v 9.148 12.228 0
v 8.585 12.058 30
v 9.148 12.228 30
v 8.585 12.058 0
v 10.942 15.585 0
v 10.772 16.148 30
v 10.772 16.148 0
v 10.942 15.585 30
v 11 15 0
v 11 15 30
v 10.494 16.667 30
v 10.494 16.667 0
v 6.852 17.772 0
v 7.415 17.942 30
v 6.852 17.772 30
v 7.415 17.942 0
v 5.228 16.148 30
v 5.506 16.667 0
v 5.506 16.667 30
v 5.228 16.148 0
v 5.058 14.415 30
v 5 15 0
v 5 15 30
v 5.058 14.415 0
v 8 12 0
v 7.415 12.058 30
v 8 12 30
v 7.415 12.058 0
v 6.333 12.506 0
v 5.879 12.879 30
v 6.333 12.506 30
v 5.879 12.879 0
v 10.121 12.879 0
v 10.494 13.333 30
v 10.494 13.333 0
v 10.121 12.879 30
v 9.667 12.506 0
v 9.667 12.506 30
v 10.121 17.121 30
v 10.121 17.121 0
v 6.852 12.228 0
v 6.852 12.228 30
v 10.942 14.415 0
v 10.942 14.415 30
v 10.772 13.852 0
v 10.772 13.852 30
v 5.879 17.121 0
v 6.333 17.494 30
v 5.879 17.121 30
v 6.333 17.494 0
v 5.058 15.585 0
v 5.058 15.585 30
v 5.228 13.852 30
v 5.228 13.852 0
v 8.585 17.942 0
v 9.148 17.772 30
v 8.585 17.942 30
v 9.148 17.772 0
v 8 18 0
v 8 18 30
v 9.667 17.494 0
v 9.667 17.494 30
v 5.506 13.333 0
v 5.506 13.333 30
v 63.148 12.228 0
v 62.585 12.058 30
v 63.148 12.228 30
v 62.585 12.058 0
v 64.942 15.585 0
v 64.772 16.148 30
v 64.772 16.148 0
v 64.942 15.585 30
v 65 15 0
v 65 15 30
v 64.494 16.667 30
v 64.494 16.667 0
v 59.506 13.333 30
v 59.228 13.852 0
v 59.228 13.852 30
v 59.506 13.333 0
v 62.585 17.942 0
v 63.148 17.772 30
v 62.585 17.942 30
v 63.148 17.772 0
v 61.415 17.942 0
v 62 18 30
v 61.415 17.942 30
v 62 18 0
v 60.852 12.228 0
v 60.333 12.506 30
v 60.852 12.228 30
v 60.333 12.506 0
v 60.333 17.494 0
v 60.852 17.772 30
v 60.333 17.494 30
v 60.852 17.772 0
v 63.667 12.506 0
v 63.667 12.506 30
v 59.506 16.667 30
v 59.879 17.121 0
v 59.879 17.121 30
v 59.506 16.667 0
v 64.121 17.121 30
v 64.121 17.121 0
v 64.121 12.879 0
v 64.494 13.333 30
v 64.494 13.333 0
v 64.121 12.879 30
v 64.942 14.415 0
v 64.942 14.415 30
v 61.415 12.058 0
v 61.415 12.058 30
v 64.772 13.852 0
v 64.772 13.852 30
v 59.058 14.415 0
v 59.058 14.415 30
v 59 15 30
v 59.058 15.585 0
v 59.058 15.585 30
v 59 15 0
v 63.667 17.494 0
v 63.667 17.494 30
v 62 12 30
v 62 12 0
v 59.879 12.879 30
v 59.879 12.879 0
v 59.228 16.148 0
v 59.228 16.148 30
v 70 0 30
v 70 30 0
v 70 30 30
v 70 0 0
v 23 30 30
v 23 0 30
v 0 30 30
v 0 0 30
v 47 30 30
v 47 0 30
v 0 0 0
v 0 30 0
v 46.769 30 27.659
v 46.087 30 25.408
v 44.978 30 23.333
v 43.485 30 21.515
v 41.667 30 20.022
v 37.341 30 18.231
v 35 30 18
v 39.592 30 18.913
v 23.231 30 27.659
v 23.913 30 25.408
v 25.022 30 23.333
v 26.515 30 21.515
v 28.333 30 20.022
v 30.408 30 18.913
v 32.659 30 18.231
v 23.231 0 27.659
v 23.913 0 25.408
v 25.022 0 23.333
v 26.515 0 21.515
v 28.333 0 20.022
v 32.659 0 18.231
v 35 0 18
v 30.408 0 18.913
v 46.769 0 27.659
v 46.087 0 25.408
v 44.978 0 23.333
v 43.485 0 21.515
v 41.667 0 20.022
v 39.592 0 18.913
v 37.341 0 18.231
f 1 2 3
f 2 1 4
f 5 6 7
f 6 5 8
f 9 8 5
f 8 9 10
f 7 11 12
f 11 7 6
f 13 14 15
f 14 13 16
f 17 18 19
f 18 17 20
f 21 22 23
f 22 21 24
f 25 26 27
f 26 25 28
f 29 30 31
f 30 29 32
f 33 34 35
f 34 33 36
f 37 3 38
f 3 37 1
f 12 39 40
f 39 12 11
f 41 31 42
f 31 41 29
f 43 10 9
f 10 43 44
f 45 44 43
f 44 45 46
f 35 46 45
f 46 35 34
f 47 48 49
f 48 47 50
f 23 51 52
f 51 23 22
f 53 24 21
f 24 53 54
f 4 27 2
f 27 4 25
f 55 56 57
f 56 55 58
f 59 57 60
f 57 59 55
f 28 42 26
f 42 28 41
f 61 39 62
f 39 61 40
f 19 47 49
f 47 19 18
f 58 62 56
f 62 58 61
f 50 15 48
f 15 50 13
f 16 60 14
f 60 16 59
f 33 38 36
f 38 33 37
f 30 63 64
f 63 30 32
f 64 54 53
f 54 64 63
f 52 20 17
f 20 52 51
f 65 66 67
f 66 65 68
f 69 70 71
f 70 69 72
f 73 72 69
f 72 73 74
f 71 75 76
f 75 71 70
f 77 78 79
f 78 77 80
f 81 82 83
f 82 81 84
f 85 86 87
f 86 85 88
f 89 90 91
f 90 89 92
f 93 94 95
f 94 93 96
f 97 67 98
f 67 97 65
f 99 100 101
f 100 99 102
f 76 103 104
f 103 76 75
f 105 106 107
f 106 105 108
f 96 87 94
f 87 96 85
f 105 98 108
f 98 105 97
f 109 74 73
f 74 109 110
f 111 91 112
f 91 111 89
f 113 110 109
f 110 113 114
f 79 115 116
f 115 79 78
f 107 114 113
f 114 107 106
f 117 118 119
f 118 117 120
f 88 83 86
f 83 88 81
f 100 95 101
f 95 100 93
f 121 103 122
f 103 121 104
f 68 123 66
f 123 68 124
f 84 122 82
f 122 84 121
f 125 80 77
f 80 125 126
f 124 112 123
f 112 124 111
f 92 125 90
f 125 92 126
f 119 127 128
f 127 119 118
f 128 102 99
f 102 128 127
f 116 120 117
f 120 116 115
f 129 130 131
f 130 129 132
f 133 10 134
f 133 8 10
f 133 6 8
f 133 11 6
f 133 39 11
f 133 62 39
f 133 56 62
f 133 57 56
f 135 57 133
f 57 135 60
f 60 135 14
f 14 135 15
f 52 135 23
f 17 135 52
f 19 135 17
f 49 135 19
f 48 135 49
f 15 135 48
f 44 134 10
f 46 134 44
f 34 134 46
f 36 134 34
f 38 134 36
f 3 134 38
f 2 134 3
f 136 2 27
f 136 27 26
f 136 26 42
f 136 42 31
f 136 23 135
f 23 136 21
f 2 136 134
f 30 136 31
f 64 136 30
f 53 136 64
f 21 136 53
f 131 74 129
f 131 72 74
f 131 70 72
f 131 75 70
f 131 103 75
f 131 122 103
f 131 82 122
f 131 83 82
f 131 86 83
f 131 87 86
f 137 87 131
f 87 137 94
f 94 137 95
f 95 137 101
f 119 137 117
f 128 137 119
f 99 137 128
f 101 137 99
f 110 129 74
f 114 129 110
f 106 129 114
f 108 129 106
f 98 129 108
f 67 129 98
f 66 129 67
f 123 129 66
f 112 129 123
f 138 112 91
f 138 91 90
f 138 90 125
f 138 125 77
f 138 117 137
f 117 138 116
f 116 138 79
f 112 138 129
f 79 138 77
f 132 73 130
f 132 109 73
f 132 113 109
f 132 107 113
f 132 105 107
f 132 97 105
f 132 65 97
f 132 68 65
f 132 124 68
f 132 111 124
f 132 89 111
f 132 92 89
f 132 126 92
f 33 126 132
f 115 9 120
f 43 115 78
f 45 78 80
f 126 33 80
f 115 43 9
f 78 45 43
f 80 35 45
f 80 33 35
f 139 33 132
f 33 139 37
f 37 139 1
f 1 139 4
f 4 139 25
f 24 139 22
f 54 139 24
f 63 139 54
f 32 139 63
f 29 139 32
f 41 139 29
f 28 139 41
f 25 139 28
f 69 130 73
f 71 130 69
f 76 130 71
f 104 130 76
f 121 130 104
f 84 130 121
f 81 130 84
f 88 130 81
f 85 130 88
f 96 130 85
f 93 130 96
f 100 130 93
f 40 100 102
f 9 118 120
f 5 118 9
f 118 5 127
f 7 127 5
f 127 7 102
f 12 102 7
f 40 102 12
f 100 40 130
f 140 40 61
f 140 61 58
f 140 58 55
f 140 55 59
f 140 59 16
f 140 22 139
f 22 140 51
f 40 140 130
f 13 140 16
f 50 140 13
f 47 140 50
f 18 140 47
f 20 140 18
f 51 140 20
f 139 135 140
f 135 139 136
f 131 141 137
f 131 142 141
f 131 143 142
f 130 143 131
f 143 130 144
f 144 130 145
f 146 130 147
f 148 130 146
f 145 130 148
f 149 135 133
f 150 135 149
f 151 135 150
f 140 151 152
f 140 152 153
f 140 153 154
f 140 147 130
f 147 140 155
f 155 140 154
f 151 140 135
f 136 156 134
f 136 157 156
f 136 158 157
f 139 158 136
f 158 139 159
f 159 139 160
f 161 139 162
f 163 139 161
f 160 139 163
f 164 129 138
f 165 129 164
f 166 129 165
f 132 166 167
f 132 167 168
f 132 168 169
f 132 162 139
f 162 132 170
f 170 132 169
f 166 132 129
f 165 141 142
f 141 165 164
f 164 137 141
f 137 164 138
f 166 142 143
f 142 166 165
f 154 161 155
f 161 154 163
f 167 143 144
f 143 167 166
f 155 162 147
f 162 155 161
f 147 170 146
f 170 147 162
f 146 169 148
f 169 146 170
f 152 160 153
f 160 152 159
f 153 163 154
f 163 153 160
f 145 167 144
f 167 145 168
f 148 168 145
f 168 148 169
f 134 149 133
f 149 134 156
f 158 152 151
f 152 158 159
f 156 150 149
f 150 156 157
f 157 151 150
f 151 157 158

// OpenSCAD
$fn = 32;

// ----------------------------------------------------------------------
// Saddle clamp: plain shaft clamp
// ----------------------------------------------------------------------

// --- parameters (mm) ---
blk_l = 70;               // block length, X
blk_w = 30;               // block width, Y
blk_h = 30;               // block height
clamp_r = 12;             // shaft groove radius
hole_r = 3;               // bolt hole radius
hole_m = 8;               // bolt hole margin from the ends

saw_depth = clamp_r + 3;  // saw kerf depth

difference() {
  cube([blk_l, blk_w, blk_h]);
  translate([blk_l / 2, -1, blk_h])
    rotate([-90, 0, 0])
      cylinder(h = blk_w + 2, r = clamp_r);
  for (sx = [0, 1])
    translate([sx ? blk_l - hole_m : hole_m, blk_w / 2, -1])
      cylinder(r = hole_r, h = blk_h + 2);
}
